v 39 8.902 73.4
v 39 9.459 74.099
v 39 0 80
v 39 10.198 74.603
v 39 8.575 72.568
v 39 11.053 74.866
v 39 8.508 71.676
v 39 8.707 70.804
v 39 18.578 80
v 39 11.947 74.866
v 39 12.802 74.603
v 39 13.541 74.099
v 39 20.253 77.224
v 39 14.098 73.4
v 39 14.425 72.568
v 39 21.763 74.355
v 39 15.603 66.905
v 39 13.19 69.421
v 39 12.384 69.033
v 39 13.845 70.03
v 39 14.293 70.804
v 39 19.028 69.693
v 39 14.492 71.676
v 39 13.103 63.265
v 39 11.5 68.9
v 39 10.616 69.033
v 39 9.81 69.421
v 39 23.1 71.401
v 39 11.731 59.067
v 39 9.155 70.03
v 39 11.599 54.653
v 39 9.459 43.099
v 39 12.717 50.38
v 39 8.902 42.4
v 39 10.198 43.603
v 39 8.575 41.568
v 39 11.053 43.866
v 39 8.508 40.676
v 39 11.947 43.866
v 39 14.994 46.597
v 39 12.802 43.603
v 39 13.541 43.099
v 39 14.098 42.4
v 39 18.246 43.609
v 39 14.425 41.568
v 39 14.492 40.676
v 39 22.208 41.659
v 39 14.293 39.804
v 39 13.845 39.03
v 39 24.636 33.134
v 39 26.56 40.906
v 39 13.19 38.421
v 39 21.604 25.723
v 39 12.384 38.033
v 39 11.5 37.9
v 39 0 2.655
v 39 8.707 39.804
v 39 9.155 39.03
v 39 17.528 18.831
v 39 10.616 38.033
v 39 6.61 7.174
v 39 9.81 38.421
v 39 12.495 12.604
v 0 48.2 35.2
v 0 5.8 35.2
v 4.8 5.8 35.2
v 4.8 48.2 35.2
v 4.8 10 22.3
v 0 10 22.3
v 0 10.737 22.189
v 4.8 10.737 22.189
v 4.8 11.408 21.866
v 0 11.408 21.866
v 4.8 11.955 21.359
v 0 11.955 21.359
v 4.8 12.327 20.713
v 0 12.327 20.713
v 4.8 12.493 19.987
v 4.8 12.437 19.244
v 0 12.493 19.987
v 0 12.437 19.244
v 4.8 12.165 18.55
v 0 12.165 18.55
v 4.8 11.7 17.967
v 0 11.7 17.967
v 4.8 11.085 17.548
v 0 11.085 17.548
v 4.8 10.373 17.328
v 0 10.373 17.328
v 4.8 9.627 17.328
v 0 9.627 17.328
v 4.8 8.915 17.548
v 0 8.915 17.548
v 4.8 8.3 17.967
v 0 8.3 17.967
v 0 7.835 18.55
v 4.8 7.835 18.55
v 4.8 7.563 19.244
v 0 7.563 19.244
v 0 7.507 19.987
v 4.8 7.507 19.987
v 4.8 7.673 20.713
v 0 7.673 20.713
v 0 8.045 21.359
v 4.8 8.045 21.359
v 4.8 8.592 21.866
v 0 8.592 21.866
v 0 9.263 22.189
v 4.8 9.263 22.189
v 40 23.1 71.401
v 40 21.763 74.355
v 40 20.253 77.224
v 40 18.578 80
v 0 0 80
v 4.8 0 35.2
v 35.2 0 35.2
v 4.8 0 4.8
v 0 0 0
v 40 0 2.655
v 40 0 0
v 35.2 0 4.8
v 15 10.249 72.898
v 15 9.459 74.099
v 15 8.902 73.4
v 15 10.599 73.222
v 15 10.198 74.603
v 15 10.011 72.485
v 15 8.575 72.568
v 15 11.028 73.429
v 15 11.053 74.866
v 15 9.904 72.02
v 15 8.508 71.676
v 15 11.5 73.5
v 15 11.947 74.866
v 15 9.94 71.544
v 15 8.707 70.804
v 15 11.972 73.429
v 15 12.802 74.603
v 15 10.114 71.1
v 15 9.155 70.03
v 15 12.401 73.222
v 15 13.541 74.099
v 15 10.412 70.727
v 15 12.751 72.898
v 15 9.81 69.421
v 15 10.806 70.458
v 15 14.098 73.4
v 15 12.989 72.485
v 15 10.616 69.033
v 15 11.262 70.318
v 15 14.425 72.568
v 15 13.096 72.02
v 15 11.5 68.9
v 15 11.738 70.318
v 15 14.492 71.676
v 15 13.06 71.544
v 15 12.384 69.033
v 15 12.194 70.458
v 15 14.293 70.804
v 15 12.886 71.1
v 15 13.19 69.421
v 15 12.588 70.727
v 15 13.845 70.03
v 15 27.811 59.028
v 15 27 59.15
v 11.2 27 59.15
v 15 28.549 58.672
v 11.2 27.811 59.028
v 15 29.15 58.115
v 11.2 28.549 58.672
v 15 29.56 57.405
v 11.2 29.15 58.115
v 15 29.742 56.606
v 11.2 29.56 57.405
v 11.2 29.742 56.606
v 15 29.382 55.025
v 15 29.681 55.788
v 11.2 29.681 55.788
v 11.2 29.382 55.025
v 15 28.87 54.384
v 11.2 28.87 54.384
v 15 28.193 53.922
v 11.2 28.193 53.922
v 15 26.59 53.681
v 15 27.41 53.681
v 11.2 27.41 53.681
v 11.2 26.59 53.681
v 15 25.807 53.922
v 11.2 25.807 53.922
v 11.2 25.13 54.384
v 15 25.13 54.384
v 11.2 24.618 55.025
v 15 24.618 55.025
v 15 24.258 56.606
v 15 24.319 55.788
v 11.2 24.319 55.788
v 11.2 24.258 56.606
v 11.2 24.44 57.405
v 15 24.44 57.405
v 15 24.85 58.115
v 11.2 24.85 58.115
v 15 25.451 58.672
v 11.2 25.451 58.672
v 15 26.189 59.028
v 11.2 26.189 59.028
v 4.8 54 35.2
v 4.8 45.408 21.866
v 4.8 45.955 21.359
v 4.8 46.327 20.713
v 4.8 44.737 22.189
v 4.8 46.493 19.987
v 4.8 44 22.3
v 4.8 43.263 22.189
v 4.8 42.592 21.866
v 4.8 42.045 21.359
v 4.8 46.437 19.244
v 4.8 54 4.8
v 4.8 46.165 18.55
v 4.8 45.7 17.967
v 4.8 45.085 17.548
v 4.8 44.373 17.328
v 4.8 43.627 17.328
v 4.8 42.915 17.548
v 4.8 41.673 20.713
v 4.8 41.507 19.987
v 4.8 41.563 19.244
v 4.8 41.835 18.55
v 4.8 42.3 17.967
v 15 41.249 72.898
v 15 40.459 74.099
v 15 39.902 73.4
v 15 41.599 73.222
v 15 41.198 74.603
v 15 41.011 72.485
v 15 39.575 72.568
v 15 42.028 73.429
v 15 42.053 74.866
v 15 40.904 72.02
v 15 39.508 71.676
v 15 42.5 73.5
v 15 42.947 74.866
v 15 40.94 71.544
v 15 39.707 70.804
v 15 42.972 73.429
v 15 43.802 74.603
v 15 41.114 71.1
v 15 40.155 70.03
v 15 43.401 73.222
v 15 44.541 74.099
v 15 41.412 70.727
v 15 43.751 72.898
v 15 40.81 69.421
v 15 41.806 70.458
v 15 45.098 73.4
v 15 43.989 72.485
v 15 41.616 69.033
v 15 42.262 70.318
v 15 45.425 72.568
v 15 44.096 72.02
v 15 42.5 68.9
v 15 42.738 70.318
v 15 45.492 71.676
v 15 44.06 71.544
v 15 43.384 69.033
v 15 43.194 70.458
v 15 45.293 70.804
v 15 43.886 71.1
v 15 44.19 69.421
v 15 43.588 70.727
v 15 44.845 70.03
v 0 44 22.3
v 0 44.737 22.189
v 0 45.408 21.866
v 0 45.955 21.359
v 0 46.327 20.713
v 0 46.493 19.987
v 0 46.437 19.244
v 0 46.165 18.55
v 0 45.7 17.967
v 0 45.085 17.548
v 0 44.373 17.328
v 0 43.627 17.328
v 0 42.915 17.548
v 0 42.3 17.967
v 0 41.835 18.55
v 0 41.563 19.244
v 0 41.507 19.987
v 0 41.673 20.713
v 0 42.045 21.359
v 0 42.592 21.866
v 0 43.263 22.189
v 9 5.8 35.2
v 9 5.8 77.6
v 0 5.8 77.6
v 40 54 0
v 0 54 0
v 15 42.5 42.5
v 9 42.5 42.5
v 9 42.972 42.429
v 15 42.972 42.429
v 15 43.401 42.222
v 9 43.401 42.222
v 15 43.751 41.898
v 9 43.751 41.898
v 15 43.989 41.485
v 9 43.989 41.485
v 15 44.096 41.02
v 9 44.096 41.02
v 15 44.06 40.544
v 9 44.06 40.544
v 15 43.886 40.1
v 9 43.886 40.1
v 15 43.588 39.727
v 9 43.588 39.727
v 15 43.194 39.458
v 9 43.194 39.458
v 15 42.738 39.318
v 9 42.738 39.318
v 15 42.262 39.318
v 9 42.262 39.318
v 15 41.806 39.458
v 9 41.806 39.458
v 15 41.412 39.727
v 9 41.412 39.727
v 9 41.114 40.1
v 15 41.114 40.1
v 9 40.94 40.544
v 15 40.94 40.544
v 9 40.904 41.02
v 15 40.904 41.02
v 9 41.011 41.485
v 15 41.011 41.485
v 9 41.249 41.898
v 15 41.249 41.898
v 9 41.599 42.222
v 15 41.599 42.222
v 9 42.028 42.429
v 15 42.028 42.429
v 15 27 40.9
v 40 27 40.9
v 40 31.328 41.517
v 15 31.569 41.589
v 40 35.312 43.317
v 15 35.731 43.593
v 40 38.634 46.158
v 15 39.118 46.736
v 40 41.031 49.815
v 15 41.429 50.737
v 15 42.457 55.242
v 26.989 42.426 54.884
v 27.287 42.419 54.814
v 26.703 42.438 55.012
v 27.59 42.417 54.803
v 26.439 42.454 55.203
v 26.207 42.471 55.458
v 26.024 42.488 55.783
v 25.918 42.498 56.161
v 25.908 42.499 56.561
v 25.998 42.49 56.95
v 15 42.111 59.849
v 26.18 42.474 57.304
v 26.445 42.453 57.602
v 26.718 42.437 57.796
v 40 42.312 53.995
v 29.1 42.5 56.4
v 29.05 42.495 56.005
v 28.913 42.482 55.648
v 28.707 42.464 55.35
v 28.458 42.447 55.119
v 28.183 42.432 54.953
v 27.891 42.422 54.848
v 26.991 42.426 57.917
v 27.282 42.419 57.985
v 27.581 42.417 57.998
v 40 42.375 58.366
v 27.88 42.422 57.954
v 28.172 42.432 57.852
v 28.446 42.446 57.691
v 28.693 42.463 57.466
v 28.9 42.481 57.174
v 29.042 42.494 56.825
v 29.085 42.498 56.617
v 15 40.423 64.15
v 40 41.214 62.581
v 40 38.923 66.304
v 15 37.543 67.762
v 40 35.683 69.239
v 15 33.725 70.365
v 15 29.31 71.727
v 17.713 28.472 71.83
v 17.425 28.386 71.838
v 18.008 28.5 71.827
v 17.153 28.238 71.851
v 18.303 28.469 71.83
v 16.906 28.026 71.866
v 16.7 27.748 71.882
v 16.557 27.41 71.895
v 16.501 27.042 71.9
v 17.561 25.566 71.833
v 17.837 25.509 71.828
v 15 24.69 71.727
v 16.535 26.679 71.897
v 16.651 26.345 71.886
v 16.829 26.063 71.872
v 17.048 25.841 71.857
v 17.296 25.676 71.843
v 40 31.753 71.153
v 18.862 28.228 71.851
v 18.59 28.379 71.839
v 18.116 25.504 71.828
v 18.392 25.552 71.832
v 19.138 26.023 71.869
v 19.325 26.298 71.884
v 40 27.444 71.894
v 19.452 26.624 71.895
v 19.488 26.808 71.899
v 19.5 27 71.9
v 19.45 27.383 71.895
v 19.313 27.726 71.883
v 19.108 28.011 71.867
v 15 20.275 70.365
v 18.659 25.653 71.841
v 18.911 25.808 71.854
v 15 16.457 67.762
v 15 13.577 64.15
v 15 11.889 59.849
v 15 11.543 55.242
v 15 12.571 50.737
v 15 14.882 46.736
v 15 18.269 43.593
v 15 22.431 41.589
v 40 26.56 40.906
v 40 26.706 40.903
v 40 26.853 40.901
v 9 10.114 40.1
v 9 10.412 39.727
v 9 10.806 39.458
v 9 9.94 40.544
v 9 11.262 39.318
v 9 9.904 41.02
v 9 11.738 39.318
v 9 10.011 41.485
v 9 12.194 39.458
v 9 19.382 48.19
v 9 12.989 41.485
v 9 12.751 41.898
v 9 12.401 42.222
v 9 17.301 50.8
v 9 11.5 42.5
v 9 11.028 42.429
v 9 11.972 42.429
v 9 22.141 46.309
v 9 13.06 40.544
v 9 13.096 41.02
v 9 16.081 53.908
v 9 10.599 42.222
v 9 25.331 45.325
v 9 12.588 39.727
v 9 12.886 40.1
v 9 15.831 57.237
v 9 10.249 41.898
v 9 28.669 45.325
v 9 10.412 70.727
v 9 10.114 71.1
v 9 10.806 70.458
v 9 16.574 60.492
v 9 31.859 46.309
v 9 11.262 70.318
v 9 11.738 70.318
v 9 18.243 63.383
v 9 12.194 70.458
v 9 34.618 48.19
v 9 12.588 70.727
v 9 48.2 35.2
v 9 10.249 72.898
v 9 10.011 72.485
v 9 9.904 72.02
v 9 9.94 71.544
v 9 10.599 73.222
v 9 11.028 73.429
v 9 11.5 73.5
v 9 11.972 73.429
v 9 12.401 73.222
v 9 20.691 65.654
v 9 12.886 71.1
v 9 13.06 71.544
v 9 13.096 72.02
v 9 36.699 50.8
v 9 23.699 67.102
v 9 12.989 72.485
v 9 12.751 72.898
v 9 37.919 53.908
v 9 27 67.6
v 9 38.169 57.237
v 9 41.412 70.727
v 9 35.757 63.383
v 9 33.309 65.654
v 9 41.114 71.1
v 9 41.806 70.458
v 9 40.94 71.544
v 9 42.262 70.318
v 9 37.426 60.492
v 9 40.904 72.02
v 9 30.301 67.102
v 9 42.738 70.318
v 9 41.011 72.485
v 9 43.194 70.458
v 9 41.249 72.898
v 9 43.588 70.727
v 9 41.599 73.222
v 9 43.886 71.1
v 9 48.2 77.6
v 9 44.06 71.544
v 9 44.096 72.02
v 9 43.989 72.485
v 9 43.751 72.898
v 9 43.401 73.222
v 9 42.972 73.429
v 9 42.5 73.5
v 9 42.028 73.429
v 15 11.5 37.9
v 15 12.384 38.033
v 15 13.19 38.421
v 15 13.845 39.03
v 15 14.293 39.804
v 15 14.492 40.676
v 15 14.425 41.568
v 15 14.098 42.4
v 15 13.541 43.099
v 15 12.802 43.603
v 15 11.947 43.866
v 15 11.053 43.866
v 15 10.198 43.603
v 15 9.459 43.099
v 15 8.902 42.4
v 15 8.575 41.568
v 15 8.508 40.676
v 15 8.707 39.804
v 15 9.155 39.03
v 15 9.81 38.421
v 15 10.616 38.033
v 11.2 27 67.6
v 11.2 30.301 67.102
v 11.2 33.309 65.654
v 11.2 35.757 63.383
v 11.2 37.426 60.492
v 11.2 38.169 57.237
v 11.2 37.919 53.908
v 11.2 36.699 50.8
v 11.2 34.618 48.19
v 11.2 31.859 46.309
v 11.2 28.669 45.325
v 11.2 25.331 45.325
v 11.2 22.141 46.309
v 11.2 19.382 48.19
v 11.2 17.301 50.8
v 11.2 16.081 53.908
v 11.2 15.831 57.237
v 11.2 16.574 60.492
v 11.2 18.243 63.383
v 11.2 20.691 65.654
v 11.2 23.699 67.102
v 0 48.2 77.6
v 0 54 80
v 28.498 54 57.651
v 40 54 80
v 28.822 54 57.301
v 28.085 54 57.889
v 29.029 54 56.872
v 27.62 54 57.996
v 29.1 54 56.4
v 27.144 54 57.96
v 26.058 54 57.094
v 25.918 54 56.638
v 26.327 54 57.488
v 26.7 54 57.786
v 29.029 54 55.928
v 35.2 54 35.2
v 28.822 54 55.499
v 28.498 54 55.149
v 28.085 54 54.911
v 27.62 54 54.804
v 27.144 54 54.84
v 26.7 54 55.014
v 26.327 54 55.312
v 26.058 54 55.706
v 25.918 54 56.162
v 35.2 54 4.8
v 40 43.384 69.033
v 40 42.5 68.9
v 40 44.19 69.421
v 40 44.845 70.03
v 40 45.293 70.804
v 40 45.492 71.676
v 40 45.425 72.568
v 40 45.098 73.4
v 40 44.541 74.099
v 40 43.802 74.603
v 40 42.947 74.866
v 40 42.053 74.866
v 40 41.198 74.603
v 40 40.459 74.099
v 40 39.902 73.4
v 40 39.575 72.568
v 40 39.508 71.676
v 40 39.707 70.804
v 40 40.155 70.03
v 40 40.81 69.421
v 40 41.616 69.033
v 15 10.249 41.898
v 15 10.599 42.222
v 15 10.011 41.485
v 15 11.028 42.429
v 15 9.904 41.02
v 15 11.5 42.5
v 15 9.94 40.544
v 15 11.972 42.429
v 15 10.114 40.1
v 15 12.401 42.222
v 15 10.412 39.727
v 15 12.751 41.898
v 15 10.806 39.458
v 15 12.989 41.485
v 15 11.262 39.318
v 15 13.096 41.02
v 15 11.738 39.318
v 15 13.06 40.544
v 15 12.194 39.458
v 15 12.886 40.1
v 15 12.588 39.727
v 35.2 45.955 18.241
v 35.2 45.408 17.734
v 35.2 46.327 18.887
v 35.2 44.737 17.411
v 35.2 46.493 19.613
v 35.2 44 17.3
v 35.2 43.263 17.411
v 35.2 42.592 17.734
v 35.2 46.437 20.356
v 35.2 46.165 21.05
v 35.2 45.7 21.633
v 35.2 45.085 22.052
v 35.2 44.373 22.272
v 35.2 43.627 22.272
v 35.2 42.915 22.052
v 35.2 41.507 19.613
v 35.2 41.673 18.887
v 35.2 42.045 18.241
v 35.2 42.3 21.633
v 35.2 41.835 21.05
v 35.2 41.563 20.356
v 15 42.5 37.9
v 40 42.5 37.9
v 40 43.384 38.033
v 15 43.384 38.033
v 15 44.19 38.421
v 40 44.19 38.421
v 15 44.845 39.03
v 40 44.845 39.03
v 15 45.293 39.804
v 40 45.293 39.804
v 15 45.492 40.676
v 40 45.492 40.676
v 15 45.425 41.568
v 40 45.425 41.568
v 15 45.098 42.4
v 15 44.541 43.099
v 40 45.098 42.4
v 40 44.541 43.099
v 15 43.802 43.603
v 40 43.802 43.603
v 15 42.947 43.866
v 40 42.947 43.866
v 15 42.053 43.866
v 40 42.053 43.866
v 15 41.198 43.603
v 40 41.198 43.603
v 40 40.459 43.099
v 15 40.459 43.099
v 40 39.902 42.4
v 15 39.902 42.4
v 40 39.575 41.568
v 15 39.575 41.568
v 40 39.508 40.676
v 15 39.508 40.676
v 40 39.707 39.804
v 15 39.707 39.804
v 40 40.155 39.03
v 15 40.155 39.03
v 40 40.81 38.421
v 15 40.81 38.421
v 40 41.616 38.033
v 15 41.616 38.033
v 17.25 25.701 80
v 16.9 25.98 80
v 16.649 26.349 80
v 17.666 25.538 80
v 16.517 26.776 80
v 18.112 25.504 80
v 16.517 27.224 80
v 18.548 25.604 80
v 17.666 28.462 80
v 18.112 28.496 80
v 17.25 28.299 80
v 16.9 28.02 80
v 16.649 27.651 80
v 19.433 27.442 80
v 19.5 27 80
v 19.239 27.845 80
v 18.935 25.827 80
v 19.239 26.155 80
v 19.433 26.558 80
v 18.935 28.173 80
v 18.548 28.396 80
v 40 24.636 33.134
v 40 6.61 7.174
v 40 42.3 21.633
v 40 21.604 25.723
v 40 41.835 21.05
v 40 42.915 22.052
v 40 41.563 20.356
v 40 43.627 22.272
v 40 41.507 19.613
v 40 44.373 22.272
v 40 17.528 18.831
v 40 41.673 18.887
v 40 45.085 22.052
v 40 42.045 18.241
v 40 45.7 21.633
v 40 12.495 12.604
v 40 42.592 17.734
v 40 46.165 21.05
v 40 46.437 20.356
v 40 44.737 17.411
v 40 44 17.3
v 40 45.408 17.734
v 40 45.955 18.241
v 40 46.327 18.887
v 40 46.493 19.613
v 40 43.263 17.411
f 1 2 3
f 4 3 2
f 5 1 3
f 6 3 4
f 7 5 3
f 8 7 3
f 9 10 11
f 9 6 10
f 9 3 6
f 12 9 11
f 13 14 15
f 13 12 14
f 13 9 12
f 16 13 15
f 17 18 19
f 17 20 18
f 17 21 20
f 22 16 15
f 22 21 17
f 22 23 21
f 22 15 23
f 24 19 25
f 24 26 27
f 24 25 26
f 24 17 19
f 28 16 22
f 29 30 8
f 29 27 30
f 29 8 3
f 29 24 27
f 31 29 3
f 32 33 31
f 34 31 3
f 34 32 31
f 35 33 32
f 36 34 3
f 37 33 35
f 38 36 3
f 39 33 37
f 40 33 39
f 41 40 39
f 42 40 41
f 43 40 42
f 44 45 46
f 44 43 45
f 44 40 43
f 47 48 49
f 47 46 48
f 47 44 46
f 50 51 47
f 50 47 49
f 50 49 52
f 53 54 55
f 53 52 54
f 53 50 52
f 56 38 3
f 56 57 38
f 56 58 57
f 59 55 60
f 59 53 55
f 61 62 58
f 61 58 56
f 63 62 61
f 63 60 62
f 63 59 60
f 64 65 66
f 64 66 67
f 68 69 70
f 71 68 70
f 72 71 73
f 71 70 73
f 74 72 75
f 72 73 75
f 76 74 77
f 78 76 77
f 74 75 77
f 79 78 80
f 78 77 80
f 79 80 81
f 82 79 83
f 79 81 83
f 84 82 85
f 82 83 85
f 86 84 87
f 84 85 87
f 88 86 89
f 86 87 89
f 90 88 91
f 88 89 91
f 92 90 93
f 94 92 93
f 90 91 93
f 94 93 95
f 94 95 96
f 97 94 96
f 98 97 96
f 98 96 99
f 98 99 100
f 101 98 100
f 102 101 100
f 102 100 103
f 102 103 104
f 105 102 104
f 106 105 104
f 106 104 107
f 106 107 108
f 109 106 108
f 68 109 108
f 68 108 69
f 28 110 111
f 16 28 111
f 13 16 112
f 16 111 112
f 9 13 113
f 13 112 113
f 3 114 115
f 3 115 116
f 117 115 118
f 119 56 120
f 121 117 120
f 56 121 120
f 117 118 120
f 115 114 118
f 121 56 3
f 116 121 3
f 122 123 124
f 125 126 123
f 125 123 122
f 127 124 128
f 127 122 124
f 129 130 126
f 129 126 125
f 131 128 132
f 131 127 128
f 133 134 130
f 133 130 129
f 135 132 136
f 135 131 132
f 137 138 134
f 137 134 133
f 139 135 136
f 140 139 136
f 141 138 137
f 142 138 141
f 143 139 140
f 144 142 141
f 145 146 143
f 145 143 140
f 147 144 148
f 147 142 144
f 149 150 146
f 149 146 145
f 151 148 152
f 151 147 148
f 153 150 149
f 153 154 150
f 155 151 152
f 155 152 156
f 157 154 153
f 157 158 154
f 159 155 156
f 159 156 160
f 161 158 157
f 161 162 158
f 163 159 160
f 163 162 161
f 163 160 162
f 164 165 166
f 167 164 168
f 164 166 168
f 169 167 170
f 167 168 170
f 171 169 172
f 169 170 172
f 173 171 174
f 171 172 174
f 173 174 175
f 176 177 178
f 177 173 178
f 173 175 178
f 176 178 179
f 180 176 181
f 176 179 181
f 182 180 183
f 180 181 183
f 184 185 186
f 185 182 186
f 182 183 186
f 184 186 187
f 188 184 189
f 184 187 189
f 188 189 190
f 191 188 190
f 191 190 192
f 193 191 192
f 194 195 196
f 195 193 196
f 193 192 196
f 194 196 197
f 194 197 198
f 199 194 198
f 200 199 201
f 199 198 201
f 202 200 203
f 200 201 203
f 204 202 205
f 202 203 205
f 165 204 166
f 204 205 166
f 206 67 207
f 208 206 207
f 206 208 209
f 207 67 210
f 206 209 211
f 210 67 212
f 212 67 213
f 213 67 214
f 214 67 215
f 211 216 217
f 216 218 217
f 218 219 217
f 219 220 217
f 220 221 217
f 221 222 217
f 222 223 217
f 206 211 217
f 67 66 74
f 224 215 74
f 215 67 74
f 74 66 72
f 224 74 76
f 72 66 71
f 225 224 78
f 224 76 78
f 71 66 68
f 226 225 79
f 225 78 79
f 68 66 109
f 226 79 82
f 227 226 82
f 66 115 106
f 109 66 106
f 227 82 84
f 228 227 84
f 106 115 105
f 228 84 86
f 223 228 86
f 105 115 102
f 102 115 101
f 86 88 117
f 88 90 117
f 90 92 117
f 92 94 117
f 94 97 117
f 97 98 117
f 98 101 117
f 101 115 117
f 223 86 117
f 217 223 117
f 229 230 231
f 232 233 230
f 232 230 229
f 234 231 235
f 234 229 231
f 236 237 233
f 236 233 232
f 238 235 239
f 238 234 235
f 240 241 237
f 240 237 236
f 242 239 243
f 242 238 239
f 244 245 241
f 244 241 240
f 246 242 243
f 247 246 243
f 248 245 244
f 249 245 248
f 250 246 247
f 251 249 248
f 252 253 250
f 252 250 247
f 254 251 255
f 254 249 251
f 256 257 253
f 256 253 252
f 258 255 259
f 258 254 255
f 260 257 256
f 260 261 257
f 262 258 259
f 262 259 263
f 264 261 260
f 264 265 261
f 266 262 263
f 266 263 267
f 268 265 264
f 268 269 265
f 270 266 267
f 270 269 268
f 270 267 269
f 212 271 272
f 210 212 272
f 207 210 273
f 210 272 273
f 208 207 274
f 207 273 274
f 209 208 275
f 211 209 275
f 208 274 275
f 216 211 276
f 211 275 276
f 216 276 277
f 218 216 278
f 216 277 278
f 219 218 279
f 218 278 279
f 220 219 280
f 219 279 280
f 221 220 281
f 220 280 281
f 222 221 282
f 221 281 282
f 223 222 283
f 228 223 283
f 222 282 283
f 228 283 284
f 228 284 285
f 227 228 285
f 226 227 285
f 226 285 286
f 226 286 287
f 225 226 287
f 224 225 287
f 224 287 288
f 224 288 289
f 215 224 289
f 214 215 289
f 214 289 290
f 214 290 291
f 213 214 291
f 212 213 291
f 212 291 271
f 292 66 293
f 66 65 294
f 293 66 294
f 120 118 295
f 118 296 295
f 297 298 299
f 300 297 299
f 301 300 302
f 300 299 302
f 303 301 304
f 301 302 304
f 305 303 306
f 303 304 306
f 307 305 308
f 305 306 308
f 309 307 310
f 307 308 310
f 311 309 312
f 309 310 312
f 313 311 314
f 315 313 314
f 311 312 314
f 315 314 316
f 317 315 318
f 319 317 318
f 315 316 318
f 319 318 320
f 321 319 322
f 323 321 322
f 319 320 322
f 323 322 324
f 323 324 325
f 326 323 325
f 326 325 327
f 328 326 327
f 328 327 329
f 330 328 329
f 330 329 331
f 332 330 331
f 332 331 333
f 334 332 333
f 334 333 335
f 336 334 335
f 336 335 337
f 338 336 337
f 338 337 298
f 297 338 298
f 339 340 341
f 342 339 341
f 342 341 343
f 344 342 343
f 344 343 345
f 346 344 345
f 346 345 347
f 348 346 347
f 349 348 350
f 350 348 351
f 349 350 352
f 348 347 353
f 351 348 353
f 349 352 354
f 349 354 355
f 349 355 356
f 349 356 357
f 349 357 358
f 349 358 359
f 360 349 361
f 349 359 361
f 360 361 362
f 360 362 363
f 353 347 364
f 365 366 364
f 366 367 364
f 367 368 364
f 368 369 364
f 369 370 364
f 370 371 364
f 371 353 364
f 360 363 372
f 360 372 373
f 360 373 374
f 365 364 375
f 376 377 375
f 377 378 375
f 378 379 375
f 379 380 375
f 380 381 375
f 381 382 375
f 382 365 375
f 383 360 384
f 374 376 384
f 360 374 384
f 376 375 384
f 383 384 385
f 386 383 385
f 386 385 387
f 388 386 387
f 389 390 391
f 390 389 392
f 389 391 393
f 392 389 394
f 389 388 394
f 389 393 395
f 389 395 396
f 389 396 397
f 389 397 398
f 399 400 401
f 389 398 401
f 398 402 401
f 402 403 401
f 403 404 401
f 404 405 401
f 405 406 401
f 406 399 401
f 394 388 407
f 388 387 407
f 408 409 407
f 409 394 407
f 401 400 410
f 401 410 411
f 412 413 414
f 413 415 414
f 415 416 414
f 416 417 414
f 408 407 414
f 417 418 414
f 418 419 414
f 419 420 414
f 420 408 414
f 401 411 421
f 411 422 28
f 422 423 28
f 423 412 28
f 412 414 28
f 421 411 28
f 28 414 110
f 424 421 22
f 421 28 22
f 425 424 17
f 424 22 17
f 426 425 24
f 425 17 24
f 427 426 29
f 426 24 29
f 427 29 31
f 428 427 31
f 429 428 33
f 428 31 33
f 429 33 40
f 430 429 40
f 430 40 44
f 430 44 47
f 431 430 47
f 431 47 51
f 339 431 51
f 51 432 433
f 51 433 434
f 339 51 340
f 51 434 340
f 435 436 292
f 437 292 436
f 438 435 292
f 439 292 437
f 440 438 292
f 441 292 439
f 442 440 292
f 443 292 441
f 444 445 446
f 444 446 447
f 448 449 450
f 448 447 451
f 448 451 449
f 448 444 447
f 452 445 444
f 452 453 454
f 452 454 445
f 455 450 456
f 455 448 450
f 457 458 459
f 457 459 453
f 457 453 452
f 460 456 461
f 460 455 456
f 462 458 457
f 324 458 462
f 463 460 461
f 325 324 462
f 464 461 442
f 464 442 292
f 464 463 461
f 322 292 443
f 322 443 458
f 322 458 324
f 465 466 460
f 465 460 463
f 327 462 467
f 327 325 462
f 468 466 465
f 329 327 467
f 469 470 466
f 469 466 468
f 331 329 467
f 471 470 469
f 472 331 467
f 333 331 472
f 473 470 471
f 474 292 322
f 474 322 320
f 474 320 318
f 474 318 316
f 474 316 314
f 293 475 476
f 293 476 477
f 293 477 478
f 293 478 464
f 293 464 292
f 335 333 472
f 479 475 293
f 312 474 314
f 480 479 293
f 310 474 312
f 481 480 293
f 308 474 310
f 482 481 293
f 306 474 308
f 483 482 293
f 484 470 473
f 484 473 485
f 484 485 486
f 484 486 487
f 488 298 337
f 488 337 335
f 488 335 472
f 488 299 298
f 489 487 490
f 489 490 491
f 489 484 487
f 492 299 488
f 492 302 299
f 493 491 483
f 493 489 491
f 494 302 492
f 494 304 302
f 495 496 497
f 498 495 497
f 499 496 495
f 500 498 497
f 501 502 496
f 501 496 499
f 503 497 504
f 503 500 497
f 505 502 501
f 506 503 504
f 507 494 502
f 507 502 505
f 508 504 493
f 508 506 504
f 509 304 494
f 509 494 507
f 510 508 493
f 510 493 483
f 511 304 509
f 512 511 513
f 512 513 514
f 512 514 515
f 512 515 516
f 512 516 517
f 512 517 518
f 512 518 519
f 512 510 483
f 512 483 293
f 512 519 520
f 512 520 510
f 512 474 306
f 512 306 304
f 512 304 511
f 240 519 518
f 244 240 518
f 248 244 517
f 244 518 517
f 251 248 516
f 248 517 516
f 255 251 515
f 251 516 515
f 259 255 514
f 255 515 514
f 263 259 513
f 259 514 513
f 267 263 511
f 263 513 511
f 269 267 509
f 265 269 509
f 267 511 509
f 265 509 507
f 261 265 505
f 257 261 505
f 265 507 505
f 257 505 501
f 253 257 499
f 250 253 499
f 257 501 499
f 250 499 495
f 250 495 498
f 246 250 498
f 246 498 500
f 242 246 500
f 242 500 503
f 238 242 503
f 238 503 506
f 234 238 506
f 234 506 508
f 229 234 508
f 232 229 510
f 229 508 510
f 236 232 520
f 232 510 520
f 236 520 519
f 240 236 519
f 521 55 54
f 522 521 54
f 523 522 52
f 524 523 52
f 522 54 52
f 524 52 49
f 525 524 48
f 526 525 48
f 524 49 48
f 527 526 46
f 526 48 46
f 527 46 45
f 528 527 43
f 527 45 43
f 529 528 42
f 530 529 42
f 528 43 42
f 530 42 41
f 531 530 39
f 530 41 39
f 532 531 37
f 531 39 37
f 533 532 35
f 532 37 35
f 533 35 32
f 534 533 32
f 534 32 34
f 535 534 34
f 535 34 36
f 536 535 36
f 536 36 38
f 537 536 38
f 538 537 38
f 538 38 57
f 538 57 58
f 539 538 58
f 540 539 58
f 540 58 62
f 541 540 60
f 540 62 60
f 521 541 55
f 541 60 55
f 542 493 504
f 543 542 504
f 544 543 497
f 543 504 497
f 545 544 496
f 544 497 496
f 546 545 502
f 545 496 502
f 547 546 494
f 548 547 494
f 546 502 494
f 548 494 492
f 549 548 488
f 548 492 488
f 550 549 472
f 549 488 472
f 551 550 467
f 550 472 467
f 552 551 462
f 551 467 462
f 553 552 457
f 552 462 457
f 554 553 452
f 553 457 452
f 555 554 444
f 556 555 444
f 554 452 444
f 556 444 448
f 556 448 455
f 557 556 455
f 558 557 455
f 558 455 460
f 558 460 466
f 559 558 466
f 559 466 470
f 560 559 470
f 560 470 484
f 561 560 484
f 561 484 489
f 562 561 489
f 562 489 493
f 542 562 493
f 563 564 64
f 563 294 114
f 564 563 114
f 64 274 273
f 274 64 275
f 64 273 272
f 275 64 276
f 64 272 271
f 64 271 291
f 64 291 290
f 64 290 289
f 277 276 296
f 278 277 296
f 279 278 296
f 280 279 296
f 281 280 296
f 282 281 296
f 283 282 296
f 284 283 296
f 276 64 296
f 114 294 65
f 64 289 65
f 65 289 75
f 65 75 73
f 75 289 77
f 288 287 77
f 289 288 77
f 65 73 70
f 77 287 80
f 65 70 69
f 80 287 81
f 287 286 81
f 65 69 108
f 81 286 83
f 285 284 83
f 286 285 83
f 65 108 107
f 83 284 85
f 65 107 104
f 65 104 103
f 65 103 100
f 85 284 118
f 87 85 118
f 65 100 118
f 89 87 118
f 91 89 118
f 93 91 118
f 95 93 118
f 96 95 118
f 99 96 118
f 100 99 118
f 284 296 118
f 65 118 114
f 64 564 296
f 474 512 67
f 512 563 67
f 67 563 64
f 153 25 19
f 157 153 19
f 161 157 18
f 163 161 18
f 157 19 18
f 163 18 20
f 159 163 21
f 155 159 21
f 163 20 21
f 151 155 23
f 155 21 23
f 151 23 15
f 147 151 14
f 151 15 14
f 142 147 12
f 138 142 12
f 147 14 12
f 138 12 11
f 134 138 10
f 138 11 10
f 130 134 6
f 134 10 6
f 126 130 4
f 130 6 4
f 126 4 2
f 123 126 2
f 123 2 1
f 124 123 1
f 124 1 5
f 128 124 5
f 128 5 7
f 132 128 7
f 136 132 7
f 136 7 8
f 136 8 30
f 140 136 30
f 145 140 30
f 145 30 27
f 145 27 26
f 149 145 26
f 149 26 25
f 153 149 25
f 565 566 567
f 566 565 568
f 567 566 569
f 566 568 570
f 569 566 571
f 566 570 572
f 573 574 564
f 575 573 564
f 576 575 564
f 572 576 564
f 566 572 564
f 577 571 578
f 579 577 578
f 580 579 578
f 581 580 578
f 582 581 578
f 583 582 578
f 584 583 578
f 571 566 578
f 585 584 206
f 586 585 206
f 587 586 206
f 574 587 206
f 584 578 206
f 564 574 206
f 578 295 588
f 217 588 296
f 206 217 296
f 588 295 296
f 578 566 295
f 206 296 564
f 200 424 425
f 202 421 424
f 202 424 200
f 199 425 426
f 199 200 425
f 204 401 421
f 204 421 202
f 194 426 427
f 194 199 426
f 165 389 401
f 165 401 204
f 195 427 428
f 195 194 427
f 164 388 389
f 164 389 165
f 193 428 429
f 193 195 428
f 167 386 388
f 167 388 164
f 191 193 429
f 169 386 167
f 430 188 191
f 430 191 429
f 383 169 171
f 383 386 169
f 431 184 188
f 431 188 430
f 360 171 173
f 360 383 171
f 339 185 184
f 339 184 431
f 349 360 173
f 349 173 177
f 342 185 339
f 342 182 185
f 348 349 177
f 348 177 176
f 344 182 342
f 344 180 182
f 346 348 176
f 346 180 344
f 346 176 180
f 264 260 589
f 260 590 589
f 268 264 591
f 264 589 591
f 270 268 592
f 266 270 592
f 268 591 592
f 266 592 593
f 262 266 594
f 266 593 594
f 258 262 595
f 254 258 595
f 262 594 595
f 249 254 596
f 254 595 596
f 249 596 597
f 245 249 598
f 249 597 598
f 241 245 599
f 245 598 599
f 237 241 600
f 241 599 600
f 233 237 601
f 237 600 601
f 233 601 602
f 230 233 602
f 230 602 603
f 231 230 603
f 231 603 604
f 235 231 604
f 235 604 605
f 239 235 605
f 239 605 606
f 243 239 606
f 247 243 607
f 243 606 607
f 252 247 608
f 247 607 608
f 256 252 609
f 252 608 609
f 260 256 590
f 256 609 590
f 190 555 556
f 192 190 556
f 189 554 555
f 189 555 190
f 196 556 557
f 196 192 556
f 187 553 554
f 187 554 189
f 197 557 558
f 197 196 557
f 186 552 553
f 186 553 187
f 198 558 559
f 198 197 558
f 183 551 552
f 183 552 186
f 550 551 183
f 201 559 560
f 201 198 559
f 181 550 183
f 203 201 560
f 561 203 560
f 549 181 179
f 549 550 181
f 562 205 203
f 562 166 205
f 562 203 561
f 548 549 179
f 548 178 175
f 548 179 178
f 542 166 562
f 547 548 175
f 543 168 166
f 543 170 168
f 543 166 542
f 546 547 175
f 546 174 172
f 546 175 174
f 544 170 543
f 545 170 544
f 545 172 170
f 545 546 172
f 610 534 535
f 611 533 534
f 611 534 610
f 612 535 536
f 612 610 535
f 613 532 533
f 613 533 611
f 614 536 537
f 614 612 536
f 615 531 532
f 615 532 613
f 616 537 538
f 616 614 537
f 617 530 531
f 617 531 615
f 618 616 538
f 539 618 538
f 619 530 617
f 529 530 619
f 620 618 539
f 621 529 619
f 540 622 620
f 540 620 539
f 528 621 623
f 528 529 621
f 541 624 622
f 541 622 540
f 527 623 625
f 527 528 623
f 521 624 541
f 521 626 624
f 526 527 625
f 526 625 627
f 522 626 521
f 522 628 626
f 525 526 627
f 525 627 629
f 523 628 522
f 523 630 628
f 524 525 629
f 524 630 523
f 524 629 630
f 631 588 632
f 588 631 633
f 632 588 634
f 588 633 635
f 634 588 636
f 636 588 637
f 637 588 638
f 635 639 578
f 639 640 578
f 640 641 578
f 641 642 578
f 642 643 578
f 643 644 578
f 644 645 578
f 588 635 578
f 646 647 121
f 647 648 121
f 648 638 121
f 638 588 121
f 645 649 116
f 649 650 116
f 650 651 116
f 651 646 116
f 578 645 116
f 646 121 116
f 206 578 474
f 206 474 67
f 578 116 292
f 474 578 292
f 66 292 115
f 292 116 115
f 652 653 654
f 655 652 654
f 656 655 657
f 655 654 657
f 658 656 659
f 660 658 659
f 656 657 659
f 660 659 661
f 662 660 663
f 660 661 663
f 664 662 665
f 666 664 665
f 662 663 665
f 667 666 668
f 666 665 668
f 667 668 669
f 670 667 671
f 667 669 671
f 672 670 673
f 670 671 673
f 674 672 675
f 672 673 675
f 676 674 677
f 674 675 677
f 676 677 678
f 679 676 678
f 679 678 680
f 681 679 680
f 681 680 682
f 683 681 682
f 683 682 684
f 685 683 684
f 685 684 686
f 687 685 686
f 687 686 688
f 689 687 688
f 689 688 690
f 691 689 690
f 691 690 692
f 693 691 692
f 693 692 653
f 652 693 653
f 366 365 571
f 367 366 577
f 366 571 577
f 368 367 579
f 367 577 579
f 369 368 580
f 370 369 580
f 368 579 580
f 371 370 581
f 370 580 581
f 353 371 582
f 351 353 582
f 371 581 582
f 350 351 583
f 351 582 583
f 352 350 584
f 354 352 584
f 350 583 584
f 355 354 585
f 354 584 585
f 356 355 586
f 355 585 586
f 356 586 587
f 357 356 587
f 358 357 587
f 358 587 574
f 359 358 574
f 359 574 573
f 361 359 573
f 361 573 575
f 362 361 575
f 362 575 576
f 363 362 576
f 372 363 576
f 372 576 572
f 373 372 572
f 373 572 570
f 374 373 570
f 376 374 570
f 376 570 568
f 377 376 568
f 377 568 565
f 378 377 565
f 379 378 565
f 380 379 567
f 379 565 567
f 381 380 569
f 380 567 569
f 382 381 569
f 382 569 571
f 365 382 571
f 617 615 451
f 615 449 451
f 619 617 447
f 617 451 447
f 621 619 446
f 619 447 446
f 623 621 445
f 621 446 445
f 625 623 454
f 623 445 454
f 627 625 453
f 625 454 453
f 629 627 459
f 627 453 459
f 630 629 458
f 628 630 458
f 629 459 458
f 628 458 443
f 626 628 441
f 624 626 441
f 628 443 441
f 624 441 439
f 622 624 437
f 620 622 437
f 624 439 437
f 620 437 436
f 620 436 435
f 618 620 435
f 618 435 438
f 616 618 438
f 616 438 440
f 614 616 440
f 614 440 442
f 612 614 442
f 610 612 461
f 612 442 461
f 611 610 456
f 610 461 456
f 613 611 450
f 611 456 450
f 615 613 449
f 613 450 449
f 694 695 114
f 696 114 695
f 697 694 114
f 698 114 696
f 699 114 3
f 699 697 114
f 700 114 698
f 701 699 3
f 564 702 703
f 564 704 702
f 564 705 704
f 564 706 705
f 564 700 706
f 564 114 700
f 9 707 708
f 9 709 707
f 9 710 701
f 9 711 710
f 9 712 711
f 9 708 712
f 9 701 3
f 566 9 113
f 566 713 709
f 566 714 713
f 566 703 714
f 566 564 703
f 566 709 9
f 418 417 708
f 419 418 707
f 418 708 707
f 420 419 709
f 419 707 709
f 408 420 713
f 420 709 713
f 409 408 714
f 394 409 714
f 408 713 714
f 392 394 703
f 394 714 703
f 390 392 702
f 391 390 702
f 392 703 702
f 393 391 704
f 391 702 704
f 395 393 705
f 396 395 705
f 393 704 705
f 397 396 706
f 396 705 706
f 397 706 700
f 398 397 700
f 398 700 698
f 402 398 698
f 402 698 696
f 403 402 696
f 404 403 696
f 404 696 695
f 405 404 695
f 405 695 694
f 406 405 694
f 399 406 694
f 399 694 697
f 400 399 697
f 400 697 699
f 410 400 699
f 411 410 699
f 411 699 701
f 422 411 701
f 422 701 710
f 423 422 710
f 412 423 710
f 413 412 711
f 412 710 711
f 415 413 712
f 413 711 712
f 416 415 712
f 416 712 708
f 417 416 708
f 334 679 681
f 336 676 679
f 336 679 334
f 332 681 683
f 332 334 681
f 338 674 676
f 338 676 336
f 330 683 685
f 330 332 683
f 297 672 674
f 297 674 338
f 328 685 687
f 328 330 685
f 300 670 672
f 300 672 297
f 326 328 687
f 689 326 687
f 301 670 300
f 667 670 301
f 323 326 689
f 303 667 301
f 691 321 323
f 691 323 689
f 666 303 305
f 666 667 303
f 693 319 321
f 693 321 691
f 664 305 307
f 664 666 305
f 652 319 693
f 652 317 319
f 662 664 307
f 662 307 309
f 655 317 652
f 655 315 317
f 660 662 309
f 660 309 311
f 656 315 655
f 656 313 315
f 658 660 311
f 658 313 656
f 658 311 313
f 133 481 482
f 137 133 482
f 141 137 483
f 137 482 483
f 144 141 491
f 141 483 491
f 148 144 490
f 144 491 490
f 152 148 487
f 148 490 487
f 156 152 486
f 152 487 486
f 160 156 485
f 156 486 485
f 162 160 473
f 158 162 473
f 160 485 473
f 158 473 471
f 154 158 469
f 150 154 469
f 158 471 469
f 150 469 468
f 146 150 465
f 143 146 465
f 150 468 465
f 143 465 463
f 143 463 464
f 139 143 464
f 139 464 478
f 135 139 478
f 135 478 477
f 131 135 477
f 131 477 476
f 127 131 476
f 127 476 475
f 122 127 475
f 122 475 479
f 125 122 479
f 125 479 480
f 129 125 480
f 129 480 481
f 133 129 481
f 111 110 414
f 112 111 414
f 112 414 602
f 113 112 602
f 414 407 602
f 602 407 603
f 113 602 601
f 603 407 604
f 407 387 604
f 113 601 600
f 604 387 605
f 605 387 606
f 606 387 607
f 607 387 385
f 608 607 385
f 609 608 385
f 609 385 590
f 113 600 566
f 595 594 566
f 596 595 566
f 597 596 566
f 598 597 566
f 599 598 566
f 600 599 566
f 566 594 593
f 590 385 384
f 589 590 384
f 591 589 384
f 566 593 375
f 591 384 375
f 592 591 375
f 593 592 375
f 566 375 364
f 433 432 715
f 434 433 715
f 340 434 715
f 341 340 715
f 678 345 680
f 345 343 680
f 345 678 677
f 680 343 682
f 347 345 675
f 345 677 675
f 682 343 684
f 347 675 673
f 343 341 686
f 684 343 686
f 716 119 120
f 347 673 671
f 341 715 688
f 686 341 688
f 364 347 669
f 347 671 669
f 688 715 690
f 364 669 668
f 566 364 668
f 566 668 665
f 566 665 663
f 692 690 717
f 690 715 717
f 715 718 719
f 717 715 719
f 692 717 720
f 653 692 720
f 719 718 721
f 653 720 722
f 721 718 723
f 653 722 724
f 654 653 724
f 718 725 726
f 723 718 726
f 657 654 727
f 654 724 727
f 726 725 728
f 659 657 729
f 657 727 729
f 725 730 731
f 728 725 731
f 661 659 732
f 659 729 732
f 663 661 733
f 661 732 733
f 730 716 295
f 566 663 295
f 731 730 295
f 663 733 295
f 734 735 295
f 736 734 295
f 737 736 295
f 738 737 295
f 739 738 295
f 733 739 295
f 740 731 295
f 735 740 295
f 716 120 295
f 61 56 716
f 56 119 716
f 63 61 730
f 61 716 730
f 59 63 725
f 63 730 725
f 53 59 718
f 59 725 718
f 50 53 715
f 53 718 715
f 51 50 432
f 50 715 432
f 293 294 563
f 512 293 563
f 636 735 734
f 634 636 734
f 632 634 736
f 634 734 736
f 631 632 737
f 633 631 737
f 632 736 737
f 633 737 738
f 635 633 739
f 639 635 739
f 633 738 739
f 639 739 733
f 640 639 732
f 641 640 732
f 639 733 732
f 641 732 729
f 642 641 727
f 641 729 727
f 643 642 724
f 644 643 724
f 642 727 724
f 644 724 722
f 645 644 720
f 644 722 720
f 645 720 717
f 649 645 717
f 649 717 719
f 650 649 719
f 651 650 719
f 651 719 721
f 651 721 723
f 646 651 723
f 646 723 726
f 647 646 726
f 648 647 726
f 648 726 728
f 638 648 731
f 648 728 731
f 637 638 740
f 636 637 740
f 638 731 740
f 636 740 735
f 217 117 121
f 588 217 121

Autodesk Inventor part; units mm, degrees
ref_plane "YZ Plane" through (0, 0, 0) normal (1, 0, 0) x (0, 1, 0)
ref_plane "XZ Plane" through (0, 0, 0) normal (0, 1, 0) x (-1, 0, 0)
ref_plane "XY Plane" through (0, 0, 0) normal (0, 0, 1) x (1, 0, 0)
sketch "Sketch1" plane through (0, 0, 0) normal (0, 0, 1) x (1, 0, 0)
  line L0 (0, 0) -> (40, 0)
  line L1 (40, 0) -> (40, 54)
  line L2 (40, 54) -> (0, 54)
  line L3 (0, 54) -> (0, 0)
  dimension "d0" = 40
  dimension "d1" = 54
extrude "Extrusion1" add sketch "Sketch1" along normal blind 80
sketch "Sketch3" plane through (0, 0, 0) normal (0, -1, 0) x (1, 0, 0)
  line L0 (4.8, 4.8) -> (35.2, 4.8)
  line L1 (35.2, 4.8) -> (35.2, 35.2)
  line L2 (35.2, 35.2) -> (4.8, 35.2)
  line L3 (4.8, 35.2) -> (4.8, 4.8)
  line L4 (0, 0) -> (40, 0) projected
  line L5 (0, 0) -> (0, 80) projected
  dimension "d7" = 30.4
  dimension "d8" = 30.4
  dimension "d9" = 4.8
  dimension "d10" = 4.8
extrude "Extrusion2" cut sketch "Sketch3" against normal blind 80
sketch "Sketch4" plane through (0, 0, 0) normal (-1, 0, 0) x (0, 0, 1)
  line L0 (35.2, 0) -> (35.2, 54) projected
  line L1 (35.2, 5.8) -> (77.6, 5.8)
  line L2 (77.6, 5.8) -> (77.6, 48.2)
  line L3 (77.6, 48.2) -> (35.2, 48.2)
  line L4 (35.2, 48.2) -> (35.2, 5.8)
  line L5 (0, 0) -> (80, 0) projected
  point P0 (35.2, 48.2)
  dimension "d13" = 42.4
  dimension "d14" = 42.4
  dimension "d15" = 5.8
extrude "Extrusion3" cut sketch "Sketch4" against normal blind 9
sketch "Sketch5" plane through (9, 0, 0) normal (-1, 0, 0) x (0, 0, 1)
  circle A0 centre (71.9, 42.5) radius 1.6
  circle A1 centre (71.9, 11.5) radius 1.6
  circle A2 centre (40.9, 42.5) radius 1.6
  circle A3 centre (40.9, 11.5) radius 1.6
  circle A4 centre (56.4, 27) radius 2.75
  line L0 (71.9, 42.5) -> (71.9, 11.5)
  line L1 (71.9, 11.5) -> (40.9, 11.5)
  line L2 (40.9, 11.5) -> (40.9, 42.5)
  line L3 (40.9, 42.5) -> (71.9, 42.5)
  line L4 (77.6, 48.2) -> (77.6, 5.8) projected
  line L5 (35.2, 48.2) -> (77.6, 48.2) projected
  point P0 (0, 0)
  dimension "d18" = 3.2
  dimension "d19" = 31
  dimension "d20" = 31
  dimension "d21" = 5.7
  dimension "d22" = 5.7
  dimension "d23" = 15.5
  dimension "d24" = 15.5
  dimension "d25" = 5.5
extrude "Extrusion4" cut sketch "Sketch5" against normal blind 40 contours A0 L0 L3 | L3 L0 A0 | L3 L2 A2 | A2 L2 L3 | L0 L1 A1 | A1 L1 L0 | L2 L1 A3 | A3 L1 L2 | A4
sketch "Sketch7" plane through (40, 0, 0) normal (1, 0, 0) x (0, 0, -1)
  circle A0 centre (-56.4, 27) radius 15.5
  circle A1 centre (-56.4, 27) radius 2.75 projected
  circle A2 centre (-71.9, 11.5) radius 1.6 projected
  circle A3 centre (-71.9, 11.5) radius 3
  circle A4 centre (-40.9, 11.5) radius 1.6 projected
  circle A5 centre (-40.9, 11.5) radius 3
  circle A6 centre (-40.9, 42.5) radius 1.6 projected
  circle A7 centre (-40.9, 42.5) radius 3
  circle A8 centre (-71.9, 42.5) radius 1.6 projected
  circle A9 centre (-71.9, 42.5) radius 3
  point P0 (0, 0)
  point P1 (-72.8896, 14.2541)
  point P2 (-68.9459, 10.3104)
  point P3 (-43.4541, 10.3104)
  point P4 (-39.5104, 14.2541)
  point P5 (-39.5104, 39.7459)
  point P6 (-43.4541, 43.6896)
  point P7 (-68.9459, 43.6896)
  point P8 (-72.8896, 39.7459)
  dimension "d28" = 31
  dimension "d29" = 6
extrude "Extrusion5" cut sketch "Sketch7" against normal blind 25 contours A0 | A2 | A3 | A4 | A5 | A6 | A7 | A8 | A9
sketch "Sketch8" plane through (0, 0, 80) normal (0, 0, 1) x (1, 0, 0)
  circle A0 centre (18, 27) radius 1.5
  line L0 (40, 54) -> (0, 54) projected
  line L1 (40, 0) -> (40, 54) projected
  line L2 (15, 24.25) -> (15, 29.75) projected
  point P0 (0, 0)
  dimension "d32" = 3
  dimension "d33" = 27
  dimension "d35" = 3
extrude "Extrusion6" cut sketch "Sketch8" against normal blind 10
sketch "Sketch9" plane through (0, 54, 0) normal (0, 1, 0) x (1, 0, 0)
  circle A0 centre (27.5, -56.4) radius 1.6
  line L0 (15, -59.15) -> (15, -53.65) projected
  line L1 (35.2, -35.2) -> (4.8, -35.2) projected
  point P0 (0, 0)
  dimension "d38" = 12.5
  dimension "d39" = 3.2
  dimension "d43" = 21.2
extrude "Extrusion7" cut sketch "Sketch9" against normal blind 20
sketch "Sketch10" plane through (40, 0, 0) normal (1, 0, 0) x (0, 0, -1)
  circle A0 centre (-50.2, -27.6494) radius 55
  circle A1 centre (-56.4, 27) radius 2.75 projected
  line L0 (-80, 0) -> (-80, 54) projected
  point P0 (0, 0)
  point P1 (-59.1239, 26.6218)
  point P2 (-53.6606, 27.2416)
  point P3 (-35.2, 54)
  dimension "d44" = 110
  dimension "d48" = 55
  dimension "d49" = 15
extrude "Extrusion8" cut sketch "Sketch10" against normal blind 1 contours A0 A1 picked at (-46.3005, -46.3752)
sketch "Sketch11" plane through (9, 0, 0) normal (-1, 0, 0) x (0, 0, 1)
  circle A0 centre (56.4, 27) radius 11.2
  circle A1 centre (56.4, 27) radius 2.75 projected
  point P0 (0, 0)
  dimension "d50" = 22.4
extrude "Extrusion9" cut sketch "Sketch11" against normal blind 2.2
sketch "Sketch12" plane through (40, 0, 0) normal (1, 0, 0) x (0, 0, -1)
  circle A0 centre (-19.8, 44) radius 2.5
  line L0 (0, 54) -> (-80, 54) projected
  point P0 (0, 0)
  point P1 (-4.8, 54)
  dimension "d53" = 15
  dimension "d54" = 5
  dimension "d55" = 10
extrude "Extrusion10" cut sketch "Sketch12" against normal blind 10
sketch "Sketch13" plane through (0, 0, 0) normal (-1, 0, 0) x (0, 0, 1)
  circle A0 centre (19.8, 44) radius 2.5 projected
  circle A1 centre (19.8, 44) radius 2.5
  circle A2 centre (19.8, 10) radius 2.5
  line L0 (0, 54) -> (80, 54) projected
  line L1 (0, 0) -> (80, 0) projected
  point P0 (4.8, 54)
  dimension "d58" = 15
  dimension "d59" = 15
  dimension "d62" = 5
  dimension "d63" = 10
extrude "Extrusion11" cut sketch "Sketch13" against normal blind 10
equation "\"d22\" = d21"
properties part number "nema_mount"
